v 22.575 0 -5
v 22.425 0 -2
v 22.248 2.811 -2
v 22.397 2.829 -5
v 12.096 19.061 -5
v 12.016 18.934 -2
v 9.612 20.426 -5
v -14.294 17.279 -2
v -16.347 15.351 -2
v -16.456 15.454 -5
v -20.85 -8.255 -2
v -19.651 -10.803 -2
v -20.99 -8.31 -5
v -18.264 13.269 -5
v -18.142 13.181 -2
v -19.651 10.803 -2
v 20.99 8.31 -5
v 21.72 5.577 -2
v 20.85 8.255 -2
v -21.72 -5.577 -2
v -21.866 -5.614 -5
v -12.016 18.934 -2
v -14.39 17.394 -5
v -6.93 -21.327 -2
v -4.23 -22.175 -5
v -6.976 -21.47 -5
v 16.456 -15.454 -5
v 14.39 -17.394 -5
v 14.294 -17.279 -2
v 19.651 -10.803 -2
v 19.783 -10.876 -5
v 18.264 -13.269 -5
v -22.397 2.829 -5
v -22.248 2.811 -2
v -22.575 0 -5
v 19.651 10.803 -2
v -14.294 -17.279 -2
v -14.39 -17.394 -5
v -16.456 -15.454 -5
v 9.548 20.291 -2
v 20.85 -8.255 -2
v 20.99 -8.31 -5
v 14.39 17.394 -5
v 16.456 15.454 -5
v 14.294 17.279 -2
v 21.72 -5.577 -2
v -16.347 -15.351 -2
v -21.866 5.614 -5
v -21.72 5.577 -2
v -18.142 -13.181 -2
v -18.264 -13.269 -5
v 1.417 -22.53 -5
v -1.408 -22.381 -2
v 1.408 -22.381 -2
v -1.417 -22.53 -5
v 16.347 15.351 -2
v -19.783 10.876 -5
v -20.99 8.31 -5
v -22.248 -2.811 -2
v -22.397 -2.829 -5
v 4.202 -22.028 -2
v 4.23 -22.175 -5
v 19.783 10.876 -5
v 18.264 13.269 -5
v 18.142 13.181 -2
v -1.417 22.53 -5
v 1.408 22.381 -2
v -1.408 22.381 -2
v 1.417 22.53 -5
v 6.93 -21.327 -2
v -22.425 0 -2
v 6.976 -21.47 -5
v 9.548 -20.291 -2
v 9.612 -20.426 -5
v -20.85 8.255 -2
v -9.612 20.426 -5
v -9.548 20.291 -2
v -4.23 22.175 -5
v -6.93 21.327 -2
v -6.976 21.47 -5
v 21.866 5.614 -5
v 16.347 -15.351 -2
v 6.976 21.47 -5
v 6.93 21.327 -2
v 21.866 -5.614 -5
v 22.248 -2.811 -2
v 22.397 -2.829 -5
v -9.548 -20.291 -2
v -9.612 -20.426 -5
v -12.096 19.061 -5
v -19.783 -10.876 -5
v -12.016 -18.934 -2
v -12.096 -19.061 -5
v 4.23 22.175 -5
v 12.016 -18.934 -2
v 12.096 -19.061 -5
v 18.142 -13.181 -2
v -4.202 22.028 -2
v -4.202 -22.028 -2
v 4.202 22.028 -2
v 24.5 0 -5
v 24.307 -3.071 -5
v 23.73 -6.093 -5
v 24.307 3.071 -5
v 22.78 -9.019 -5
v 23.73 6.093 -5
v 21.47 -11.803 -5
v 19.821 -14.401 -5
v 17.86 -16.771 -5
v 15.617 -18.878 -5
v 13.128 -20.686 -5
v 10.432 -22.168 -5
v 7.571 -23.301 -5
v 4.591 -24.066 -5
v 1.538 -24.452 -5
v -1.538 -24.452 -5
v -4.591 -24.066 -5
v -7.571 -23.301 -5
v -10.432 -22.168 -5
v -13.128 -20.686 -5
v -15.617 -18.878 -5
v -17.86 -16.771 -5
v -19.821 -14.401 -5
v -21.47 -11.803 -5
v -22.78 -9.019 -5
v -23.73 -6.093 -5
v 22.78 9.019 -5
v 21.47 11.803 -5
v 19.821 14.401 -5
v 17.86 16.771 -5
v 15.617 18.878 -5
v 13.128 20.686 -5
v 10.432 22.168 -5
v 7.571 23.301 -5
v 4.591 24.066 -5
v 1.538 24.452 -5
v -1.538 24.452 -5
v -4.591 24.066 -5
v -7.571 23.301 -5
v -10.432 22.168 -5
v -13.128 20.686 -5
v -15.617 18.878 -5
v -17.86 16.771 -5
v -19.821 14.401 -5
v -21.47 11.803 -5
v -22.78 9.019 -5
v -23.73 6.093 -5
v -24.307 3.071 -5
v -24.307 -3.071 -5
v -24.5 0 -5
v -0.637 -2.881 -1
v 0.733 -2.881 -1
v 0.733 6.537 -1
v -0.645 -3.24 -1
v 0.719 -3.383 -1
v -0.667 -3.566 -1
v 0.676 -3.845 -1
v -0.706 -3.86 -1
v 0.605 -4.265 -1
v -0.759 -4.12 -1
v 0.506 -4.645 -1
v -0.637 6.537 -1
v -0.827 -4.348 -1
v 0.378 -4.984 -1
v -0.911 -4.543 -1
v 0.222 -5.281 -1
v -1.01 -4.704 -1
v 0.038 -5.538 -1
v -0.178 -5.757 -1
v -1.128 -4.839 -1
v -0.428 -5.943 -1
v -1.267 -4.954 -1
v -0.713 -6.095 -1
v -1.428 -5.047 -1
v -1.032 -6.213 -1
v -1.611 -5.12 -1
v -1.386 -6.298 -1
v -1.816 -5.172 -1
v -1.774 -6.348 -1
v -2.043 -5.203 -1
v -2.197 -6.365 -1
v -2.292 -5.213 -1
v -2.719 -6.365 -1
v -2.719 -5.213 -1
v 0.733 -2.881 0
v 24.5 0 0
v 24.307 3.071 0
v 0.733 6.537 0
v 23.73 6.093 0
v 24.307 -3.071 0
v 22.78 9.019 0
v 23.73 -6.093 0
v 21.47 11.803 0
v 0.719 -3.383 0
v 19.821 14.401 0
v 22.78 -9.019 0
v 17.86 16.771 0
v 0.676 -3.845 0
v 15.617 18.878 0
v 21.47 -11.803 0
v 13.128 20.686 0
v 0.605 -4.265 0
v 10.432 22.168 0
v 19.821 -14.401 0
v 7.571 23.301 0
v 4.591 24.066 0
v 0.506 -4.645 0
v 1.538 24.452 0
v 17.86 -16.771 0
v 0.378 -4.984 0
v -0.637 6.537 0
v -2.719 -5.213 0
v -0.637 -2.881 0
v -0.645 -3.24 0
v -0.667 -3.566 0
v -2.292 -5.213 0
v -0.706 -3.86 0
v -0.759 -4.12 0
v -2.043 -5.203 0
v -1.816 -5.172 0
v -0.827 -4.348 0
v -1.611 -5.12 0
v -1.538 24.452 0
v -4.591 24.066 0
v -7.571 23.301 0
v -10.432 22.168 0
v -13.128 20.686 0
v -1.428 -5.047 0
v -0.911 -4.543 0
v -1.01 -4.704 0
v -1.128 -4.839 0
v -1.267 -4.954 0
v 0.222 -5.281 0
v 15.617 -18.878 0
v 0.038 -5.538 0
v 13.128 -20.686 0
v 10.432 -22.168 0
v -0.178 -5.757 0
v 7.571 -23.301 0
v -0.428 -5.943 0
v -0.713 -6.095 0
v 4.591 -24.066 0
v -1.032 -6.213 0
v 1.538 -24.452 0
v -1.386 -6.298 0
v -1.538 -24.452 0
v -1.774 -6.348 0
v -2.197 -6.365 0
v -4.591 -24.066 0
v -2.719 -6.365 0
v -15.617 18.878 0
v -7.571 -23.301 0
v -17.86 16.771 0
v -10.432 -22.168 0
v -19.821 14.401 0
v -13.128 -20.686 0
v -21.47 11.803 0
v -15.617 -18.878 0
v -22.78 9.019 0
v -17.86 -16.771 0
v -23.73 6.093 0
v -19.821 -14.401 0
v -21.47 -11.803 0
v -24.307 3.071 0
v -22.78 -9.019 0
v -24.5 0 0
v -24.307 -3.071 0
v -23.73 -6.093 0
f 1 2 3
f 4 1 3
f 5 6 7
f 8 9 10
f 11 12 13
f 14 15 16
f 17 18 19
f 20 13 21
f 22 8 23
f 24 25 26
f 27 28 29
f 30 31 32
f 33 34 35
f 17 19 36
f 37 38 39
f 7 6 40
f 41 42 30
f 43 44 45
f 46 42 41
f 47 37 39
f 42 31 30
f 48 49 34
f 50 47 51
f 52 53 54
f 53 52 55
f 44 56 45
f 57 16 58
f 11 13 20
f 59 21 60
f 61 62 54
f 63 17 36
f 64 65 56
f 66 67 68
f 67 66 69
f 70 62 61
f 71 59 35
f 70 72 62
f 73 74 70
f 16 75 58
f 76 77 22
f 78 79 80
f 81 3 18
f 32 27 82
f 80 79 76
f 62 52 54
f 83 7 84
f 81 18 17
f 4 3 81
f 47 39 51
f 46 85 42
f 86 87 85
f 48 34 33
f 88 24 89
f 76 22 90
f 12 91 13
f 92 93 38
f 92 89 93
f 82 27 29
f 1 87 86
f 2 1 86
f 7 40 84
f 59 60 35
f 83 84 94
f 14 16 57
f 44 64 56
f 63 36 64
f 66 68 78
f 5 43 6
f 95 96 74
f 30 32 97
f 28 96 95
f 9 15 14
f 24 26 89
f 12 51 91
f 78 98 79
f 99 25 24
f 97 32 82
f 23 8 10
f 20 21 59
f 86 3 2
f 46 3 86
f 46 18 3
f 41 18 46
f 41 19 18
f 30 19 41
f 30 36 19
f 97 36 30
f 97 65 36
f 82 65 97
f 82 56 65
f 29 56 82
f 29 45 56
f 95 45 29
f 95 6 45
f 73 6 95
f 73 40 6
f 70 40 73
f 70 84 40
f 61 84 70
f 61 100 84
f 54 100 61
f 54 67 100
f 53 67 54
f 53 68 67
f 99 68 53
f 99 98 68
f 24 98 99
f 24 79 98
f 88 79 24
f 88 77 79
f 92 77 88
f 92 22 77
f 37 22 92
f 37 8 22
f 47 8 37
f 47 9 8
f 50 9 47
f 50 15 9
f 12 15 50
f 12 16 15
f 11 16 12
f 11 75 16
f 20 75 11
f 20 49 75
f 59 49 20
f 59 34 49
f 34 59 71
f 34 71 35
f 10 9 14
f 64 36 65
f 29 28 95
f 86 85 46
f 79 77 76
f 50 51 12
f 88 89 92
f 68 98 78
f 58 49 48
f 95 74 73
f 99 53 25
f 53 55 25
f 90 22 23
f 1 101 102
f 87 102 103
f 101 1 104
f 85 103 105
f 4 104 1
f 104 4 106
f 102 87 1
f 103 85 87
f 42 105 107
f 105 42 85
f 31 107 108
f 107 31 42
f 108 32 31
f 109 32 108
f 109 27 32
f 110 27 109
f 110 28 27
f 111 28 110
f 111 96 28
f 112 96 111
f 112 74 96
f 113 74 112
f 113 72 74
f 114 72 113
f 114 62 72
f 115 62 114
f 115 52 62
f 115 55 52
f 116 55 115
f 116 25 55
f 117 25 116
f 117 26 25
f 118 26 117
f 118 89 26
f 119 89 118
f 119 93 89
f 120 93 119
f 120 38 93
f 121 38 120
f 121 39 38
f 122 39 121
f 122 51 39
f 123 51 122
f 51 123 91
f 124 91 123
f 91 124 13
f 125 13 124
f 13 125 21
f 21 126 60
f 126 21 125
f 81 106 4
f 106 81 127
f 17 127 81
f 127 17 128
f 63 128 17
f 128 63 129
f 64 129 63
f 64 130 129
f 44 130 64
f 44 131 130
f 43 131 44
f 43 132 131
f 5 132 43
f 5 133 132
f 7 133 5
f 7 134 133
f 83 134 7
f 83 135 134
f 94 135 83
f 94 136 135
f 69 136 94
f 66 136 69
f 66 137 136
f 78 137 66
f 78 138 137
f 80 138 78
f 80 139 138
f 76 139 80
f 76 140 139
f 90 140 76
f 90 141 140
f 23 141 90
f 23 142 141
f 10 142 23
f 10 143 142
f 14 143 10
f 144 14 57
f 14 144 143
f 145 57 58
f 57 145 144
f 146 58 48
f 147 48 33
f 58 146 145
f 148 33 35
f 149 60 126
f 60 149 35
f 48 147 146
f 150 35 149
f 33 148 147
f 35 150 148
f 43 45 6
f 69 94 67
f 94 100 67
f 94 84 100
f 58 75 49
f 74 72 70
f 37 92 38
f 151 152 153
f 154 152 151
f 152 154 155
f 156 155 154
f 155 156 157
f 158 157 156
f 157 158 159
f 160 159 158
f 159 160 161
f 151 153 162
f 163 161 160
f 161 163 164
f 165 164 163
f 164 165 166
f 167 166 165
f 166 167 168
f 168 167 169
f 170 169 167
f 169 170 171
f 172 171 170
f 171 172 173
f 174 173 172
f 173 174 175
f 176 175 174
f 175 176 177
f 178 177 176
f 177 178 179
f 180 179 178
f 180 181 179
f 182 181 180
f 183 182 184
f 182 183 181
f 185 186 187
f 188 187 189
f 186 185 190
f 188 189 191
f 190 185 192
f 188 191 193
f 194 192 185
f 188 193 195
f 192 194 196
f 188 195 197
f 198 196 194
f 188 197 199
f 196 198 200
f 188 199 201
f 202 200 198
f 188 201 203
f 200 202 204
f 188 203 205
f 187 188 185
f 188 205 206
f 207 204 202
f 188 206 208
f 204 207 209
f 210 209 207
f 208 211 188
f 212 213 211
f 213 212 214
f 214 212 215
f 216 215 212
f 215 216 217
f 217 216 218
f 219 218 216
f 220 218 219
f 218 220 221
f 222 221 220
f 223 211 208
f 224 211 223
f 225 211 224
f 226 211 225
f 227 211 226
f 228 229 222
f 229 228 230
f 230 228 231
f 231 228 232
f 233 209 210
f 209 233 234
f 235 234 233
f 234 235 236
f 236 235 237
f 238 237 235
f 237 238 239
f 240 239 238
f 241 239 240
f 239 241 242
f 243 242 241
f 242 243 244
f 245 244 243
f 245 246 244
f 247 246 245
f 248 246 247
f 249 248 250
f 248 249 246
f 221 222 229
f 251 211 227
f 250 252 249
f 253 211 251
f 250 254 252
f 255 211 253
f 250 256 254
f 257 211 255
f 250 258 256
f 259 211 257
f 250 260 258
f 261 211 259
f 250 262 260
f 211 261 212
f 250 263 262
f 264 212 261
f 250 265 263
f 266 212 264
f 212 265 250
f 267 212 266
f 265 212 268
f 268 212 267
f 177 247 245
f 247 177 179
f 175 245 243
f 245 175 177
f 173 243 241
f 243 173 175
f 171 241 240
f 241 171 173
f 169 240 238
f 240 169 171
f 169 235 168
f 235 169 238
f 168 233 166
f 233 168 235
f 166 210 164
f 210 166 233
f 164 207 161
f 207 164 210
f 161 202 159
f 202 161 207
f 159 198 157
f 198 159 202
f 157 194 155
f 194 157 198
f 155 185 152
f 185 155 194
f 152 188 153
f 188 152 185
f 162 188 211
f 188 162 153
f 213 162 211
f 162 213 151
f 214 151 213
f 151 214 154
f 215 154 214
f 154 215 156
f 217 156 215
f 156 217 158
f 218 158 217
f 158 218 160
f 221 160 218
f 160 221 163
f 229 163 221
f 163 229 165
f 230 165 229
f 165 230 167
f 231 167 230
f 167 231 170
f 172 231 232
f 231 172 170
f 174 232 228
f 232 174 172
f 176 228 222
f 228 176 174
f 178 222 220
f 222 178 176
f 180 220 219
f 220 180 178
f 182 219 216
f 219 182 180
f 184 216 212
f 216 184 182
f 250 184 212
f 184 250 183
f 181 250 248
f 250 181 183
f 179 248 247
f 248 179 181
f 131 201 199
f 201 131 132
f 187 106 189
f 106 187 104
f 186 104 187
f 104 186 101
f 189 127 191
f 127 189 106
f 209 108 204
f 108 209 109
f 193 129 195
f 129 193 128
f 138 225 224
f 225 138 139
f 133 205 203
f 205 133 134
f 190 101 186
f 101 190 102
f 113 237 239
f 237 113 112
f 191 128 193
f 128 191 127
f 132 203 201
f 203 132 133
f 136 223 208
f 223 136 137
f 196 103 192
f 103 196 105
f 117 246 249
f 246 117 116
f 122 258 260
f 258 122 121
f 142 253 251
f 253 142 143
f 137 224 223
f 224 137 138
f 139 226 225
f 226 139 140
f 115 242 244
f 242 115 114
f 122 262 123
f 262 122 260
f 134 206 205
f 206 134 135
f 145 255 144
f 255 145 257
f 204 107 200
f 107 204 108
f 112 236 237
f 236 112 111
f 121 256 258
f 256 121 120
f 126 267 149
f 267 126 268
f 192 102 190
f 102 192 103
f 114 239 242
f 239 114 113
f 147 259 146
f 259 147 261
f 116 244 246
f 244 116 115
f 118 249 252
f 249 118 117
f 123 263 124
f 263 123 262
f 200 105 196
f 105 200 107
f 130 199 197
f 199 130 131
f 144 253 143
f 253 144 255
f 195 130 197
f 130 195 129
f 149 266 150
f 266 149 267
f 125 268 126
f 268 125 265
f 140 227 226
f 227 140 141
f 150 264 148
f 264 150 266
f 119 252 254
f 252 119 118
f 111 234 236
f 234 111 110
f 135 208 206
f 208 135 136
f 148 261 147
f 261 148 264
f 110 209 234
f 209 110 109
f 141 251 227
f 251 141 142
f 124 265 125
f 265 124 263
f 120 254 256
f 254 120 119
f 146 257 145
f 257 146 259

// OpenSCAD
$fn = 50;

difference() {
	union() {
		translate(v = [0, 0, -5.0]) {
			cylinder(h = 5, r = 24.5);
		}
	}
	union() {
		#translate(v = [0, 0, -5.0]) {
			cylinder(h = 3, r1 = 22.575, r2 = 22.425);
		}
		translate(v = [0, 0, -1]) {
			linear_extrude(height = 1) {
				text(font = "Impact", halign = "center", size = 10, text = "J", valign = "center");
			}
		}
	}
}
